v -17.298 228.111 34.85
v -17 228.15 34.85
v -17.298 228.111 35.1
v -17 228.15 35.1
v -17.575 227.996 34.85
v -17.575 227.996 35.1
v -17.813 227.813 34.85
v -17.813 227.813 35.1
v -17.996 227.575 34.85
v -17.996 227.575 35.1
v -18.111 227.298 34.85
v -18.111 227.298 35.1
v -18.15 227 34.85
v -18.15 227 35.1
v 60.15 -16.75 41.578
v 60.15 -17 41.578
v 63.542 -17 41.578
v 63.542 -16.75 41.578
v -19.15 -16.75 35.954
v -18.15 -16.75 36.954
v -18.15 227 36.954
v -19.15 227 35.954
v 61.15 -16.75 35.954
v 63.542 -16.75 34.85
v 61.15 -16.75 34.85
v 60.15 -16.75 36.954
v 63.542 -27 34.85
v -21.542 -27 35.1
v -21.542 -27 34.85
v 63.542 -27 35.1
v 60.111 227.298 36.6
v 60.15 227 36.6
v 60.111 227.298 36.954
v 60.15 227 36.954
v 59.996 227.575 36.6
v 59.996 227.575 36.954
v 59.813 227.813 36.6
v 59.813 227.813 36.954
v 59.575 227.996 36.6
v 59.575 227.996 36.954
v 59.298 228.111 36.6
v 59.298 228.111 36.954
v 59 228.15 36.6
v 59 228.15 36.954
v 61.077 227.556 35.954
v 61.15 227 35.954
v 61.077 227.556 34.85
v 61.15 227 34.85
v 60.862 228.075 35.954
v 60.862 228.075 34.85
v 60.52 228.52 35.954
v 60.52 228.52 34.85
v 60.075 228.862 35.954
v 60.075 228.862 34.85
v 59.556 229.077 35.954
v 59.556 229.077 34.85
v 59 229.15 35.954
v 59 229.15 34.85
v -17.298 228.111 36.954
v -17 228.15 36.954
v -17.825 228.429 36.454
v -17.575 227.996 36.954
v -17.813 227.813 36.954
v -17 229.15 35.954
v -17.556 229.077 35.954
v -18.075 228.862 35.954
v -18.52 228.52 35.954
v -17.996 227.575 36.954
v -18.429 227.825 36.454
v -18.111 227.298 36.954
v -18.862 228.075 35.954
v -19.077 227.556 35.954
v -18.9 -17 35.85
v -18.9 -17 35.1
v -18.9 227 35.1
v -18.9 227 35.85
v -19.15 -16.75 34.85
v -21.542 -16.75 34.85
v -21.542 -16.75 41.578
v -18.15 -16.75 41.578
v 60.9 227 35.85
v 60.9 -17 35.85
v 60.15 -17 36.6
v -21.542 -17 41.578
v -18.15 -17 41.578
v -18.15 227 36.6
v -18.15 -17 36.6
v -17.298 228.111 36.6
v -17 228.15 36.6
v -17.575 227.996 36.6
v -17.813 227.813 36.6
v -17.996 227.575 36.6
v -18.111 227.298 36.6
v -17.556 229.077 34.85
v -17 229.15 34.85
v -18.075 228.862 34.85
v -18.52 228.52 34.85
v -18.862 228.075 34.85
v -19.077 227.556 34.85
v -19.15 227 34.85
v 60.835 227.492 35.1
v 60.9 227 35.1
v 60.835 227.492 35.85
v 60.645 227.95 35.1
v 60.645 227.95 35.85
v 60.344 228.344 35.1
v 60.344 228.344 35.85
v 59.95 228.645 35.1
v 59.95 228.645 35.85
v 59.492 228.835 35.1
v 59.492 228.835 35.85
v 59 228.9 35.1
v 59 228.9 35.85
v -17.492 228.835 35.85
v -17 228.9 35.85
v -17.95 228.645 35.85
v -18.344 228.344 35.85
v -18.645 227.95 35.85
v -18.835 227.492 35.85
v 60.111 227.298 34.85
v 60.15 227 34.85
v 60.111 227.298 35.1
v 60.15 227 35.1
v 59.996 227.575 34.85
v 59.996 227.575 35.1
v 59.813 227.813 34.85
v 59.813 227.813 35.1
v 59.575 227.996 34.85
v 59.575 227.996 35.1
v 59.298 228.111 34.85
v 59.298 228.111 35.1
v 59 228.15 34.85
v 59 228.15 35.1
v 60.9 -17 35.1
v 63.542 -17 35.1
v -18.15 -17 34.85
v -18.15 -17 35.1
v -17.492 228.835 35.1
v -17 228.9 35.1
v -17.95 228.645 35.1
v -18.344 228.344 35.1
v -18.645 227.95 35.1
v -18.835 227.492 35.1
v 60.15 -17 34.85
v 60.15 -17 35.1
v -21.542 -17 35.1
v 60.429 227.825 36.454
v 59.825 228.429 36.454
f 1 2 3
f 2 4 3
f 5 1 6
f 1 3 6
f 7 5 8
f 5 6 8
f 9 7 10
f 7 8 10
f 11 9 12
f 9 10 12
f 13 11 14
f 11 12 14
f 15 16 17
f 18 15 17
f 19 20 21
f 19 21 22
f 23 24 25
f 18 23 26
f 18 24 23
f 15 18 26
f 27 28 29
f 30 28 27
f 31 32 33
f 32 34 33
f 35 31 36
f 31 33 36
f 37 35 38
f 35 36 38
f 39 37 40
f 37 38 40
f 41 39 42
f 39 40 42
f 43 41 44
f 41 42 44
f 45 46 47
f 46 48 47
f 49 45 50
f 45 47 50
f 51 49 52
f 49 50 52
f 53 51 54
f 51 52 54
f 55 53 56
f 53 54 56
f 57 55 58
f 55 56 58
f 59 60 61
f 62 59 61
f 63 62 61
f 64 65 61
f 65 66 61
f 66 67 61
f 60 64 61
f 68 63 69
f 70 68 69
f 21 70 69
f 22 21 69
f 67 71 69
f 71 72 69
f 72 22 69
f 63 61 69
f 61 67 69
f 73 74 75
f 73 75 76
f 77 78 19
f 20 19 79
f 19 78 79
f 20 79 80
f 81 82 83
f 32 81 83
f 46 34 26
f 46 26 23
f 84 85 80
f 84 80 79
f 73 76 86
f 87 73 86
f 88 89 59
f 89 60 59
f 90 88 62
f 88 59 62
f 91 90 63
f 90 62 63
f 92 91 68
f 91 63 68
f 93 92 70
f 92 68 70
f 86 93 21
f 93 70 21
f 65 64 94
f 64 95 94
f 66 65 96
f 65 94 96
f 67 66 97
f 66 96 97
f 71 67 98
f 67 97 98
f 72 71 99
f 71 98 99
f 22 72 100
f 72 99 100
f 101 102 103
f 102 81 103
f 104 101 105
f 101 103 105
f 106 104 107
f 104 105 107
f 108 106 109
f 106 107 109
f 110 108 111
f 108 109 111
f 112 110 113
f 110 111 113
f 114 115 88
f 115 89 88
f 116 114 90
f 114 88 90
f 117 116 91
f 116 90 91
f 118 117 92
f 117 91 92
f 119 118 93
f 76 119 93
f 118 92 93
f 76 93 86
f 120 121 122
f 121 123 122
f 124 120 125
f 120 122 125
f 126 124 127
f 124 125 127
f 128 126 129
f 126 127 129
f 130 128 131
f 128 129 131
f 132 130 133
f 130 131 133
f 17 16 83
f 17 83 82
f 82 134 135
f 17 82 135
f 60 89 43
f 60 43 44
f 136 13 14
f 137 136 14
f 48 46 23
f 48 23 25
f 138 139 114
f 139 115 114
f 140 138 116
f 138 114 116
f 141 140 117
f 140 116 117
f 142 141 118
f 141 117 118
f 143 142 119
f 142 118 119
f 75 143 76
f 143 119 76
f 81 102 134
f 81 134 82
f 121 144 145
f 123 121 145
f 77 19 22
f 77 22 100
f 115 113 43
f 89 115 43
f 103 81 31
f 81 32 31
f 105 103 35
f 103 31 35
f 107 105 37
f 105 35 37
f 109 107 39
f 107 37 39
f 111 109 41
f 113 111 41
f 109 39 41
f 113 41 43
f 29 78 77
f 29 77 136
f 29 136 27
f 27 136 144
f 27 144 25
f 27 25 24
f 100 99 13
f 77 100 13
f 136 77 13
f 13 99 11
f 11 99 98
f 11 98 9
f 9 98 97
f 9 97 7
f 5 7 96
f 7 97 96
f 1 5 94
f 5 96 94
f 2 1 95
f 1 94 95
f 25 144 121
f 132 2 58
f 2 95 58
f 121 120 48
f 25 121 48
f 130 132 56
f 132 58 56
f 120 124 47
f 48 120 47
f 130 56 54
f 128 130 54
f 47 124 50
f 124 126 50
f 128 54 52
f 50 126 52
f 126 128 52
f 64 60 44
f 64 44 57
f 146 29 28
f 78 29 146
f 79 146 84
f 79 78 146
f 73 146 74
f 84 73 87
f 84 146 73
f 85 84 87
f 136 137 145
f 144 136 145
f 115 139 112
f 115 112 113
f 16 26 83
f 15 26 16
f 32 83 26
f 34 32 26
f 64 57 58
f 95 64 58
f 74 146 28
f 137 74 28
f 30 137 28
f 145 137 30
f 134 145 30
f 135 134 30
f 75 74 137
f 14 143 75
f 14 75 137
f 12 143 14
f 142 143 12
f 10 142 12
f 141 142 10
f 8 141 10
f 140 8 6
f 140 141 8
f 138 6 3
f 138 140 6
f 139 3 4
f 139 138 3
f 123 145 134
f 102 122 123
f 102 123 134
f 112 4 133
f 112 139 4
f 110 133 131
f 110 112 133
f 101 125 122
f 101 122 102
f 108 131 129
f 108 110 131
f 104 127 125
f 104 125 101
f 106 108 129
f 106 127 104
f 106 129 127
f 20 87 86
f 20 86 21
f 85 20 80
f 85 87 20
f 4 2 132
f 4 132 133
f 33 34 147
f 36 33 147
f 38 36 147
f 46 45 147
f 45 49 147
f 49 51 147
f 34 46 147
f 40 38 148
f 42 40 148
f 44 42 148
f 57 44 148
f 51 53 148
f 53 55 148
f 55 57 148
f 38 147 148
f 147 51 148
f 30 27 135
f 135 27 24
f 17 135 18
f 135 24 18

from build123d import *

# Parameters (mm, degrees)
PAD008_DEPTH    = 0.25
SKETCH021_W     = 101.318497
SKETCH021_H     = 15.372729
POCKET001_DEPTH = 41.578934
SKETCH020_W     = 85.083054
SKETCH020_H     = 0.25
PAD009_DEPTH    = 10


with BuildPart() as part:
    # AdditivePipe005: sweep along a path in Sketch016
    with BuildLine(Plane.XY) as additivepipe005_path:
        Line((-18.15, 227), (-18.15, -17))
        ThreePointArc((-18.15, -17), (-17.8131727984, -17.8131727984), (-17, -18.15))
        Line((-17, -18.15), (59, -18.15))
        ThreePointArc((59, -18.15), (59.8131727984, -17.8131727984), (60.15, -17))
        Line((60.15, -17), (60.15, 227))
        ThreePointArc((60.15, 227), (59.8131727984, 227.8131727984), (59, 228.15))
        Line((59, 228.15), (-17, 228.15))
        ThreePointArc((-17, 228.15), (-17.8131727984, 227.8131727984), (-18.15, 227))
    # Sketch015 → AdditivePipe005 (sweep)
    with BuildSketch(Plane.XZ):
        Polygon((-18.15, 36.6), (-18.9, 35.85), (-18.9, 35.1), (-18.15, 35.1), (-18.15, 34.85), (-19.15, 34.85), (-19.15, 35.9535533906), (-18.15, 36.9535533906), align=None)
    sweep(path=additivepipe005_path.line)

    # Sketch019 → Pad008 (new body)
    with BuildSketch(Plane.XZ.offset(17)):
        Polygon((-18.15, 36.9535533906), (-18.15, 41.577934), (-21.541527, 41.577934), (-21.541527, 34.85), (-19.15, 34.85), (-19.15, 35.9535533906), align=None)
        Polygon((60.15, 36.9535533906), (60.15, 41.577934), (63.541527, 41.577934), (63.541527, 34.85), (61.15, 34.85), (61.15, 35.9535533906), align=None)
    extrude(amount=-PAD008_DEPTH)

    # Sketch021 → Pocket001 (cut, through all)
    with BuildSketch(Plane.XY):
        with Locations((14.6124585, -24.6863645)):
            Rectangle(SKETCH021_W, SKETCH021_H)
    extrude(amount=POCKET001_DEPTH, mode=Mode.SUBTRACT)

    # Sketch020 (on Face13 of Pad008) → Pad009 (join)
    with BuildSketch(Plane.XZ.offset(17)):
        with Locations((21, 34.975)):
            Rectangle(SKETCH020_W, SKETCH020_H)
    extrude(amount=PAD009_DEPTH)


solid = part.part
